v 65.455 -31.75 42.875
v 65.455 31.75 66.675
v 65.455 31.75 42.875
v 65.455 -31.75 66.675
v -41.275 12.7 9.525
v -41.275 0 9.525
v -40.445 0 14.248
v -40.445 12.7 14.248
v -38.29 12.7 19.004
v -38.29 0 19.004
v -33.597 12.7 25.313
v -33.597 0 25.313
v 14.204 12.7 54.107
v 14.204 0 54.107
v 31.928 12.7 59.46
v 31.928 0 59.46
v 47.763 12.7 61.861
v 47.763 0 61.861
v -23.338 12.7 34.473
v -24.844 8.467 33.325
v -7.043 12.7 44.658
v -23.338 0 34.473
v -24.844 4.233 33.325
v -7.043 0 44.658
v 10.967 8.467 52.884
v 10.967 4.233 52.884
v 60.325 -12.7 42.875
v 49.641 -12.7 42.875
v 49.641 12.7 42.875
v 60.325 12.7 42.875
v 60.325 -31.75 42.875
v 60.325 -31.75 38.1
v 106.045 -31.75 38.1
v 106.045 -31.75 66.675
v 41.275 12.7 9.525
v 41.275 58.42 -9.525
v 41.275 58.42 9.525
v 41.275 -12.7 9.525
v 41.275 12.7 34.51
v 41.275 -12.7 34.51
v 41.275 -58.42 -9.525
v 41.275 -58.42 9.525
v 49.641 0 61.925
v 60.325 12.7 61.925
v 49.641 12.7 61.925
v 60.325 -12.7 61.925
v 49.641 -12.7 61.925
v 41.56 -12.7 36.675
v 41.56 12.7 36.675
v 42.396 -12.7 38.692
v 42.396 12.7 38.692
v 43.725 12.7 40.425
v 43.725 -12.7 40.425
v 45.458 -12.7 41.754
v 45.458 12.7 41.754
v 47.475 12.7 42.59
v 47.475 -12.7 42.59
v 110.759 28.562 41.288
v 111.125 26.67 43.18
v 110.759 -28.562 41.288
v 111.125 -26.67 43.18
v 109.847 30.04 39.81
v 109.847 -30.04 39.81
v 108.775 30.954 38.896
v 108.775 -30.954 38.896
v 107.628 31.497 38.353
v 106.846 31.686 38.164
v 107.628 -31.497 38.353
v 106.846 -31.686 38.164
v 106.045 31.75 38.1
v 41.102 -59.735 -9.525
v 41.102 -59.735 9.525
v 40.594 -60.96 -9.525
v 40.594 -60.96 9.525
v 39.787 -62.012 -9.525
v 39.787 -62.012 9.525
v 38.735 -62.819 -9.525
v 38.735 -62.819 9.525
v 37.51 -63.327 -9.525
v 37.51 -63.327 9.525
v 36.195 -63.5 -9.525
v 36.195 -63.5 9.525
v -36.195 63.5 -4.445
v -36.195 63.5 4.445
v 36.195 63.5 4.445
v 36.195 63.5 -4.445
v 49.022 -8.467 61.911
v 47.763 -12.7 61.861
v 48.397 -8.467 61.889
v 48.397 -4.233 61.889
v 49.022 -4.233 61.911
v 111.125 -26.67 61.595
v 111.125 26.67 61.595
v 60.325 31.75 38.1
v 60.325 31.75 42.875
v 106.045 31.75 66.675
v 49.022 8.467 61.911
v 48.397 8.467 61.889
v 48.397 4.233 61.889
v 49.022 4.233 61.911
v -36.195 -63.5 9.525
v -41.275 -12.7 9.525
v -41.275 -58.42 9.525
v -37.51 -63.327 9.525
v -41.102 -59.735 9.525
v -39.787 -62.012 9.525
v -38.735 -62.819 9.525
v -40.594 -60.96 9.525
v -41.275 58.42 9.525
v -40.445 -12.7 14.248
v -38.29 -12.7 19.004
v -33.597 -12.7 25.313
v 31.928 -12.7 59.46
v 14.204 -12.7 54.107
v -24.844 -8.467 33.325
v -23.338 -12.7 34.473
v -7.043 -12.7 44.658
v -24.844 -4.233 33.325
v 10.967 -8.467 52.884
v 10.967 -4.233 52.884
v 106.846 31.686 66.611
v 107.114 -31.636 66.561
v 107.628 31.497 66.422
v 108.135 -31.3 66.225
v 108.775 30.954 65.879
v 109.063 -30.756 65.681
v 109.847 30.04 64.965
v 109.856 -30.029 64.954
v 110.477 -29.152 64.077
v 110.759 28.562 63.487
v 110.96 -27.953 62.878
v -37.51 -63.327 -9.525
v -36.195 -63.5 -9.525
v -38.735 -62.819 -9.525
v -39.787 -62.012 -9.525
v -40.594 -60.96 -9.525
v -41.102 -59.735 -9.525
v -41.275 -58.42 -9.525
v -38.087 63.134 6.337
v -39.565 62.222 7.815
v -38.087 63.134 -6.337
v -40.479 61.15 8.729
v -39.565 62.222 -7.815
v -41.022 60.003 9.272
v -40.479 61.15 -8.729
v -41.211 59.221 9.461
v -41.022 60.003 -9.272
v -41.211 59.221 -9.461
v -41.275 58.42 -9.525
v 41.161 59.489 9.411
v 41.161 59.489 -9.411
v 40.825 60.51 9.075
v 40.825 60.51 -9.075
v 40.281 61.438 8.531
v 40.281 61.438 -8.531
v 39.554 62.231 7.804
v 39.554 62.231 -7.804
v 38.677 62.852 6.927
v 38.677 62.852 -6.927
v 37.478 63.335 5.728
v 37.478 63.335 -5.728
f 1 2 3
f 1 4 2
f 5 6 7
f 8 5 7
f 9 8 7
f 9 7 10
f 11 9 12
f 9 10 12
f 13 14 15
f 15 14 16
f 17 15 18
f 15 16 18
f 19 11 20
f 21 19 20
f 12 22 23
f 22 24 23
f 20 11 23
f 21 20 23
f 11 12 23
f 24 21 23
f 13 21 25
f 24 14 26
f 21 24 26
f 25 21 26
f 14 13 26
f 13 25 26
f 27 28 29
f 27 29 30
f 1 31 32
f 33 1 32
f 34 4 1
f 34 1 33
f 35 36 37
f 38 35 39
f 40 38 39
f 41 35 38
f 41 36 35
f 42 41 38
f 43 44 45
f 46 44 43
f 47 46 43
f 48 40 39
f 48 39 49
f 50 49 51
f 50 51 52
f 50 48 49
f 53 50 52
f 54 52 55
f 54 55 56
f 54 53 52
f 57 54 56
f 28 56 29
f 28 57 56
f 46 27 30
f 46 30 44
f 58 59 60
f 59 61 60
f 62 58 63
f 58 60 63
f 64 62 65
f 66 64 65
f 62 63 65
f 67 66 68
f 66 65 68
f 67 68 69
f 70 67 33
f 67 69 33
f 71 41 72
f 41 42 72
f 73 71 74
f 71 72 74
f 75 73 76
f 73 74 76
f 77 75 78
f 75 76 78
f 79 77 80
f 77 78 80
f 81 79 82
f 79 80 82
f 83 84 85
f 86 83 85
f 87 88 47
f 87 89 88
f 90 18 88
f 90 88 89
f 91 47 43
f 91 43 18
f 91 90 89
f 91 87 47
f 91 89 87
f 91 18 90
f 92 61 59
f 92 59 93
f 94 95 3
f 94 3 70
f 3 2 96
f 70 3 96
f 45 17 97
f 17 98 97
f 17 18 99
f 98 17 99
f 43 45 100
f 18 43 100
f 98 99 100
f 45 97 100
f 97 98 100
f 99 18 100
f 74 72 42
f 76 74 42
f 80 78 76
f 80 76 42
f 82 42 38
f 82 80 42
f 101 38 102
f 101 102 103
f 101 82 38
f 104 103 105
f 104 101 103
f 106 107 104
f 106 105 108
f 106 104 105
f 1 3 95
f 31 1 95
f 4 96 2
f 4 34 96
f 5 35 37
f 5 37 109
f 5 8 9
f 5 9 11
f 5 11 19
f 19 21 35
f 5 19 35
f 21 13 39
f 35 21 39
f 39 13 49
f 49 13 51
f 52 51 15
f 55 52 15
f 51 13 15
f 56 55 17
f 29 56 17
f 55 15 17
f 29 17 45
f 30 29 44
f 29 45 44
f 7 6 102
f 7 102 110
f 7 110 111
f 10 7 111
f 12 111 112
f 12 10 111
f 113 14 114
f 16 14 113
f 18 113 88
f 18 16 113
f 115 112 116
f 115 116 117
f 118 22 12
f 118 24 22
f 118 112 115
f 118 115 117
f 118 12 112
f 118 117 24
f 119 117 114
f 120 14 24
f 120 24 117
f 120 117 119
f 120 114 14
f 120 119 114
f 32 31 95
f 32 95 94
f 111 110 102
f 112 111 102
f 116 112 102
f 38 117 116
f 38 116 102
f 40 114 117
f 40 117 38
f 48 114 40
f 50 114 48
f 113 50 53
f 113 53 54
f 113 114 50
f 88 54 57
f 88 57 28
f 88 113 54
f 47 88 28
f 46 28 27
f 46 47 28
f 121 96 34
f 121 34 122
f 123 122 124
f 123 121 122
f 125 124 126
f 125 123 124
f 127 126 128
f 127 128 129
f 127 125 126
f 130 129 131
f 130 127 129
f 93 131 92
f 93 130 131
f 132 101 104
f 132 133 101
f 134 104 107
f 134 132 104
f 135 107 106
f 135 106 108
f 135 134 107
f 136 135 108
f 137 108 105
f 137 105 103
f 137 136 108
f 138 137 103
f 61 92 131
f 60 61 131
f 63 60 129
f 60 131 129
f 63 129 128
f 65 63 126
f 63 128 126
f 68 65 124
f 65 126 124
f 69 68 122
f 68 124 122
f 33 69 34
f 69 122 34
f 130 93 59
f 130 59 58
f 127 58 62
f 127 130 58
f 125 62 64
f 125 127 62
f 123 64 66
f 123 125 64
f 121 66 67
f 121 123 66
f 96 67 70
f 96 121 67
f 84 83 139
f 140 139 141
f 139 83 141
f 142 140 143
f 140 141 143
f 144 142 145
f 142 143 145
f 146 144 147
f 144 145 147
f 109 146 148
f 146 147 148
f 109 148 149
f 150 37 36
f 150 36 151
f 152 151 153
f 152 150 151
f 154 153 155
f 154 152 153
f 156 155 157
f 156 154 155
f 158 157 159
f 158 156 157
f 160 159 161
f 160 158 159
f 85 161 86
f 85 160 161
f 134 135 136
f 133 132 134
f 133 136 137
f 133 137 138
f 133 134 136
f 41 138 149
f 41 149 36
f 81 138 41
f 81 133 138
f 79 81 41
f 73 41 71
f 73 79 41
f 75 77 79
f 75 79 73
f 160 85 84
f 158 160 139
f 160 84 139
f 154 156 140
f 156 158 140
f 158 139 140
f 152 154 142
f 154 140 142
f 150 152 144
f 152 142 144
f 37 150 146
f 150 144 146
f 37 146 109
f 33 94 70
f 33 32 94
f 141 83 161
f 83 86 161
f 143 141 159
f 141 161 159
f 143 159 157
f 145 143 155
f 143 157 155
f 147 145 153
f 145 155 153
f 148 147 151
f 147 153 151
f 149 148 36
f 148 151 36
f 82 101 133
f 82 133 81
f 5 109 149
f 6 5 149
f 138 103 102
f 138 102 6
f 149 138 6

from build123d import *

# Parameters (mm, degrees)
F1_DEPTH = 63.5
F2_DEPTH = 12.7
F3_DEPTH = 31.75
F4_R     = 5.08
F4_2_R   = 5.08


with BuildPart() as f1:
    # F0 (on Front) → F1 (new body, symmetric)
    with BuildSketch(Plane.XZ):
        Polygon((41.275, -9.525), (41.275, 9.525), (22.225, 9.525), (-41.275, 9.525), (-41.275, -9.525), align=None)
    extrude(amount=F1_DEPTH, both=True)

    # F0 (on Front) → F2 (join, symmetric)
    with BuildSketch(Plane.XZ):
        with BuildLine():
            Line((22.225, 9.525), (41.275, 9.525))
            Line((41.275, 9.525), (41.275, 34.509616))
            ThreePointArc((41.275, 34.509616), (43.725223, 40.424977), (49.640584, 42.8752))
            Line((49.640584, 42.8752), (60.325, 42.8752))
            Line((60.325, 42.8752), (60.325, 61.9252))
            Line((60.325, 61.9252), (49.640584, 61.9252))
            add(Edge.make_bspline(
                [(47.763247, 61.860847), (48.400175, 61.892987), (49.02619, 61.91452), (49.640584, 61.9252)],
                knots=[102.833167, 102.833167, 102.833167, 102.833167, 104.935334, 104.935334, 104.935334, 104.935334], degree=3))
            ThreePointArc((47.763247, 61.860847), (29.602089, 53.219853), (22.225, 34.509616))
            Line((22.225, 34.509616), (22.225, 9.525))
        make_face()
        with BuildLine():
            Line((-41.275, 9.525), (22.225, 9.525))
            Line((22.225, 9.525), (22.225, 34.509616))
            ThreePointArc((22.225, 34.509616), (29.602089, 53.219853), (47.763247, 61.860847))
            add(Edge.make_bspline(
                [(-41.275, 9.525), (-40.665553, 33.331984), (16.606208, 60.288623), (47.763247, 61.860847)],
                knots=[0, 0, 0, 0, 102.833167, 102.833167, 102.833167, 102.833167], degree=3))
        make_face()
    extrude(amount=F2_DEPTH, both=True)

    # F4
    f4_edges = [f1.edges().sort_by_distance(p)[0] for p in [
        (41.275, -63.5, 0),
        (41.275, 63.5, 0),
        (0, 63.5, 9.525),
        (-41.275, 63.5, 0),
        (0, 63.5, -9.525),
        (-41.275, -63.5, 0),
    ]]
    fillet(f4_edges, radius=F4_R)


with BuildPart() as f3:
    # F0 (on Front) → F3 (new body, symmetric)
    with BuildSketch(Plane.XZ):
        Polygon((65.455396, 42.8752), (60.325, 42.8752), (60.325, 38.1), (111.125, 38.1), (111.125, 66.675), (65.455396, 66.675), (65.455396, 61.9252), (65.455396, 52.4002), align=None)
    extrude(amount=F3_DEPTH, both=True)

    # F4#2
    f4_2_edges = [f3.edges().sort_by_distance(p)[0] for p in [
        (111.125, 0, 38.1),
        (111.125, 31.75, 52.3875),
        (111.125, 0, 66.675),
        (111.125, -31.75, 52.3875),
    ]]
    fillet(f4_2_edges, radius=F4_2_R)


solid = Compound([f1.part, f3.part])
